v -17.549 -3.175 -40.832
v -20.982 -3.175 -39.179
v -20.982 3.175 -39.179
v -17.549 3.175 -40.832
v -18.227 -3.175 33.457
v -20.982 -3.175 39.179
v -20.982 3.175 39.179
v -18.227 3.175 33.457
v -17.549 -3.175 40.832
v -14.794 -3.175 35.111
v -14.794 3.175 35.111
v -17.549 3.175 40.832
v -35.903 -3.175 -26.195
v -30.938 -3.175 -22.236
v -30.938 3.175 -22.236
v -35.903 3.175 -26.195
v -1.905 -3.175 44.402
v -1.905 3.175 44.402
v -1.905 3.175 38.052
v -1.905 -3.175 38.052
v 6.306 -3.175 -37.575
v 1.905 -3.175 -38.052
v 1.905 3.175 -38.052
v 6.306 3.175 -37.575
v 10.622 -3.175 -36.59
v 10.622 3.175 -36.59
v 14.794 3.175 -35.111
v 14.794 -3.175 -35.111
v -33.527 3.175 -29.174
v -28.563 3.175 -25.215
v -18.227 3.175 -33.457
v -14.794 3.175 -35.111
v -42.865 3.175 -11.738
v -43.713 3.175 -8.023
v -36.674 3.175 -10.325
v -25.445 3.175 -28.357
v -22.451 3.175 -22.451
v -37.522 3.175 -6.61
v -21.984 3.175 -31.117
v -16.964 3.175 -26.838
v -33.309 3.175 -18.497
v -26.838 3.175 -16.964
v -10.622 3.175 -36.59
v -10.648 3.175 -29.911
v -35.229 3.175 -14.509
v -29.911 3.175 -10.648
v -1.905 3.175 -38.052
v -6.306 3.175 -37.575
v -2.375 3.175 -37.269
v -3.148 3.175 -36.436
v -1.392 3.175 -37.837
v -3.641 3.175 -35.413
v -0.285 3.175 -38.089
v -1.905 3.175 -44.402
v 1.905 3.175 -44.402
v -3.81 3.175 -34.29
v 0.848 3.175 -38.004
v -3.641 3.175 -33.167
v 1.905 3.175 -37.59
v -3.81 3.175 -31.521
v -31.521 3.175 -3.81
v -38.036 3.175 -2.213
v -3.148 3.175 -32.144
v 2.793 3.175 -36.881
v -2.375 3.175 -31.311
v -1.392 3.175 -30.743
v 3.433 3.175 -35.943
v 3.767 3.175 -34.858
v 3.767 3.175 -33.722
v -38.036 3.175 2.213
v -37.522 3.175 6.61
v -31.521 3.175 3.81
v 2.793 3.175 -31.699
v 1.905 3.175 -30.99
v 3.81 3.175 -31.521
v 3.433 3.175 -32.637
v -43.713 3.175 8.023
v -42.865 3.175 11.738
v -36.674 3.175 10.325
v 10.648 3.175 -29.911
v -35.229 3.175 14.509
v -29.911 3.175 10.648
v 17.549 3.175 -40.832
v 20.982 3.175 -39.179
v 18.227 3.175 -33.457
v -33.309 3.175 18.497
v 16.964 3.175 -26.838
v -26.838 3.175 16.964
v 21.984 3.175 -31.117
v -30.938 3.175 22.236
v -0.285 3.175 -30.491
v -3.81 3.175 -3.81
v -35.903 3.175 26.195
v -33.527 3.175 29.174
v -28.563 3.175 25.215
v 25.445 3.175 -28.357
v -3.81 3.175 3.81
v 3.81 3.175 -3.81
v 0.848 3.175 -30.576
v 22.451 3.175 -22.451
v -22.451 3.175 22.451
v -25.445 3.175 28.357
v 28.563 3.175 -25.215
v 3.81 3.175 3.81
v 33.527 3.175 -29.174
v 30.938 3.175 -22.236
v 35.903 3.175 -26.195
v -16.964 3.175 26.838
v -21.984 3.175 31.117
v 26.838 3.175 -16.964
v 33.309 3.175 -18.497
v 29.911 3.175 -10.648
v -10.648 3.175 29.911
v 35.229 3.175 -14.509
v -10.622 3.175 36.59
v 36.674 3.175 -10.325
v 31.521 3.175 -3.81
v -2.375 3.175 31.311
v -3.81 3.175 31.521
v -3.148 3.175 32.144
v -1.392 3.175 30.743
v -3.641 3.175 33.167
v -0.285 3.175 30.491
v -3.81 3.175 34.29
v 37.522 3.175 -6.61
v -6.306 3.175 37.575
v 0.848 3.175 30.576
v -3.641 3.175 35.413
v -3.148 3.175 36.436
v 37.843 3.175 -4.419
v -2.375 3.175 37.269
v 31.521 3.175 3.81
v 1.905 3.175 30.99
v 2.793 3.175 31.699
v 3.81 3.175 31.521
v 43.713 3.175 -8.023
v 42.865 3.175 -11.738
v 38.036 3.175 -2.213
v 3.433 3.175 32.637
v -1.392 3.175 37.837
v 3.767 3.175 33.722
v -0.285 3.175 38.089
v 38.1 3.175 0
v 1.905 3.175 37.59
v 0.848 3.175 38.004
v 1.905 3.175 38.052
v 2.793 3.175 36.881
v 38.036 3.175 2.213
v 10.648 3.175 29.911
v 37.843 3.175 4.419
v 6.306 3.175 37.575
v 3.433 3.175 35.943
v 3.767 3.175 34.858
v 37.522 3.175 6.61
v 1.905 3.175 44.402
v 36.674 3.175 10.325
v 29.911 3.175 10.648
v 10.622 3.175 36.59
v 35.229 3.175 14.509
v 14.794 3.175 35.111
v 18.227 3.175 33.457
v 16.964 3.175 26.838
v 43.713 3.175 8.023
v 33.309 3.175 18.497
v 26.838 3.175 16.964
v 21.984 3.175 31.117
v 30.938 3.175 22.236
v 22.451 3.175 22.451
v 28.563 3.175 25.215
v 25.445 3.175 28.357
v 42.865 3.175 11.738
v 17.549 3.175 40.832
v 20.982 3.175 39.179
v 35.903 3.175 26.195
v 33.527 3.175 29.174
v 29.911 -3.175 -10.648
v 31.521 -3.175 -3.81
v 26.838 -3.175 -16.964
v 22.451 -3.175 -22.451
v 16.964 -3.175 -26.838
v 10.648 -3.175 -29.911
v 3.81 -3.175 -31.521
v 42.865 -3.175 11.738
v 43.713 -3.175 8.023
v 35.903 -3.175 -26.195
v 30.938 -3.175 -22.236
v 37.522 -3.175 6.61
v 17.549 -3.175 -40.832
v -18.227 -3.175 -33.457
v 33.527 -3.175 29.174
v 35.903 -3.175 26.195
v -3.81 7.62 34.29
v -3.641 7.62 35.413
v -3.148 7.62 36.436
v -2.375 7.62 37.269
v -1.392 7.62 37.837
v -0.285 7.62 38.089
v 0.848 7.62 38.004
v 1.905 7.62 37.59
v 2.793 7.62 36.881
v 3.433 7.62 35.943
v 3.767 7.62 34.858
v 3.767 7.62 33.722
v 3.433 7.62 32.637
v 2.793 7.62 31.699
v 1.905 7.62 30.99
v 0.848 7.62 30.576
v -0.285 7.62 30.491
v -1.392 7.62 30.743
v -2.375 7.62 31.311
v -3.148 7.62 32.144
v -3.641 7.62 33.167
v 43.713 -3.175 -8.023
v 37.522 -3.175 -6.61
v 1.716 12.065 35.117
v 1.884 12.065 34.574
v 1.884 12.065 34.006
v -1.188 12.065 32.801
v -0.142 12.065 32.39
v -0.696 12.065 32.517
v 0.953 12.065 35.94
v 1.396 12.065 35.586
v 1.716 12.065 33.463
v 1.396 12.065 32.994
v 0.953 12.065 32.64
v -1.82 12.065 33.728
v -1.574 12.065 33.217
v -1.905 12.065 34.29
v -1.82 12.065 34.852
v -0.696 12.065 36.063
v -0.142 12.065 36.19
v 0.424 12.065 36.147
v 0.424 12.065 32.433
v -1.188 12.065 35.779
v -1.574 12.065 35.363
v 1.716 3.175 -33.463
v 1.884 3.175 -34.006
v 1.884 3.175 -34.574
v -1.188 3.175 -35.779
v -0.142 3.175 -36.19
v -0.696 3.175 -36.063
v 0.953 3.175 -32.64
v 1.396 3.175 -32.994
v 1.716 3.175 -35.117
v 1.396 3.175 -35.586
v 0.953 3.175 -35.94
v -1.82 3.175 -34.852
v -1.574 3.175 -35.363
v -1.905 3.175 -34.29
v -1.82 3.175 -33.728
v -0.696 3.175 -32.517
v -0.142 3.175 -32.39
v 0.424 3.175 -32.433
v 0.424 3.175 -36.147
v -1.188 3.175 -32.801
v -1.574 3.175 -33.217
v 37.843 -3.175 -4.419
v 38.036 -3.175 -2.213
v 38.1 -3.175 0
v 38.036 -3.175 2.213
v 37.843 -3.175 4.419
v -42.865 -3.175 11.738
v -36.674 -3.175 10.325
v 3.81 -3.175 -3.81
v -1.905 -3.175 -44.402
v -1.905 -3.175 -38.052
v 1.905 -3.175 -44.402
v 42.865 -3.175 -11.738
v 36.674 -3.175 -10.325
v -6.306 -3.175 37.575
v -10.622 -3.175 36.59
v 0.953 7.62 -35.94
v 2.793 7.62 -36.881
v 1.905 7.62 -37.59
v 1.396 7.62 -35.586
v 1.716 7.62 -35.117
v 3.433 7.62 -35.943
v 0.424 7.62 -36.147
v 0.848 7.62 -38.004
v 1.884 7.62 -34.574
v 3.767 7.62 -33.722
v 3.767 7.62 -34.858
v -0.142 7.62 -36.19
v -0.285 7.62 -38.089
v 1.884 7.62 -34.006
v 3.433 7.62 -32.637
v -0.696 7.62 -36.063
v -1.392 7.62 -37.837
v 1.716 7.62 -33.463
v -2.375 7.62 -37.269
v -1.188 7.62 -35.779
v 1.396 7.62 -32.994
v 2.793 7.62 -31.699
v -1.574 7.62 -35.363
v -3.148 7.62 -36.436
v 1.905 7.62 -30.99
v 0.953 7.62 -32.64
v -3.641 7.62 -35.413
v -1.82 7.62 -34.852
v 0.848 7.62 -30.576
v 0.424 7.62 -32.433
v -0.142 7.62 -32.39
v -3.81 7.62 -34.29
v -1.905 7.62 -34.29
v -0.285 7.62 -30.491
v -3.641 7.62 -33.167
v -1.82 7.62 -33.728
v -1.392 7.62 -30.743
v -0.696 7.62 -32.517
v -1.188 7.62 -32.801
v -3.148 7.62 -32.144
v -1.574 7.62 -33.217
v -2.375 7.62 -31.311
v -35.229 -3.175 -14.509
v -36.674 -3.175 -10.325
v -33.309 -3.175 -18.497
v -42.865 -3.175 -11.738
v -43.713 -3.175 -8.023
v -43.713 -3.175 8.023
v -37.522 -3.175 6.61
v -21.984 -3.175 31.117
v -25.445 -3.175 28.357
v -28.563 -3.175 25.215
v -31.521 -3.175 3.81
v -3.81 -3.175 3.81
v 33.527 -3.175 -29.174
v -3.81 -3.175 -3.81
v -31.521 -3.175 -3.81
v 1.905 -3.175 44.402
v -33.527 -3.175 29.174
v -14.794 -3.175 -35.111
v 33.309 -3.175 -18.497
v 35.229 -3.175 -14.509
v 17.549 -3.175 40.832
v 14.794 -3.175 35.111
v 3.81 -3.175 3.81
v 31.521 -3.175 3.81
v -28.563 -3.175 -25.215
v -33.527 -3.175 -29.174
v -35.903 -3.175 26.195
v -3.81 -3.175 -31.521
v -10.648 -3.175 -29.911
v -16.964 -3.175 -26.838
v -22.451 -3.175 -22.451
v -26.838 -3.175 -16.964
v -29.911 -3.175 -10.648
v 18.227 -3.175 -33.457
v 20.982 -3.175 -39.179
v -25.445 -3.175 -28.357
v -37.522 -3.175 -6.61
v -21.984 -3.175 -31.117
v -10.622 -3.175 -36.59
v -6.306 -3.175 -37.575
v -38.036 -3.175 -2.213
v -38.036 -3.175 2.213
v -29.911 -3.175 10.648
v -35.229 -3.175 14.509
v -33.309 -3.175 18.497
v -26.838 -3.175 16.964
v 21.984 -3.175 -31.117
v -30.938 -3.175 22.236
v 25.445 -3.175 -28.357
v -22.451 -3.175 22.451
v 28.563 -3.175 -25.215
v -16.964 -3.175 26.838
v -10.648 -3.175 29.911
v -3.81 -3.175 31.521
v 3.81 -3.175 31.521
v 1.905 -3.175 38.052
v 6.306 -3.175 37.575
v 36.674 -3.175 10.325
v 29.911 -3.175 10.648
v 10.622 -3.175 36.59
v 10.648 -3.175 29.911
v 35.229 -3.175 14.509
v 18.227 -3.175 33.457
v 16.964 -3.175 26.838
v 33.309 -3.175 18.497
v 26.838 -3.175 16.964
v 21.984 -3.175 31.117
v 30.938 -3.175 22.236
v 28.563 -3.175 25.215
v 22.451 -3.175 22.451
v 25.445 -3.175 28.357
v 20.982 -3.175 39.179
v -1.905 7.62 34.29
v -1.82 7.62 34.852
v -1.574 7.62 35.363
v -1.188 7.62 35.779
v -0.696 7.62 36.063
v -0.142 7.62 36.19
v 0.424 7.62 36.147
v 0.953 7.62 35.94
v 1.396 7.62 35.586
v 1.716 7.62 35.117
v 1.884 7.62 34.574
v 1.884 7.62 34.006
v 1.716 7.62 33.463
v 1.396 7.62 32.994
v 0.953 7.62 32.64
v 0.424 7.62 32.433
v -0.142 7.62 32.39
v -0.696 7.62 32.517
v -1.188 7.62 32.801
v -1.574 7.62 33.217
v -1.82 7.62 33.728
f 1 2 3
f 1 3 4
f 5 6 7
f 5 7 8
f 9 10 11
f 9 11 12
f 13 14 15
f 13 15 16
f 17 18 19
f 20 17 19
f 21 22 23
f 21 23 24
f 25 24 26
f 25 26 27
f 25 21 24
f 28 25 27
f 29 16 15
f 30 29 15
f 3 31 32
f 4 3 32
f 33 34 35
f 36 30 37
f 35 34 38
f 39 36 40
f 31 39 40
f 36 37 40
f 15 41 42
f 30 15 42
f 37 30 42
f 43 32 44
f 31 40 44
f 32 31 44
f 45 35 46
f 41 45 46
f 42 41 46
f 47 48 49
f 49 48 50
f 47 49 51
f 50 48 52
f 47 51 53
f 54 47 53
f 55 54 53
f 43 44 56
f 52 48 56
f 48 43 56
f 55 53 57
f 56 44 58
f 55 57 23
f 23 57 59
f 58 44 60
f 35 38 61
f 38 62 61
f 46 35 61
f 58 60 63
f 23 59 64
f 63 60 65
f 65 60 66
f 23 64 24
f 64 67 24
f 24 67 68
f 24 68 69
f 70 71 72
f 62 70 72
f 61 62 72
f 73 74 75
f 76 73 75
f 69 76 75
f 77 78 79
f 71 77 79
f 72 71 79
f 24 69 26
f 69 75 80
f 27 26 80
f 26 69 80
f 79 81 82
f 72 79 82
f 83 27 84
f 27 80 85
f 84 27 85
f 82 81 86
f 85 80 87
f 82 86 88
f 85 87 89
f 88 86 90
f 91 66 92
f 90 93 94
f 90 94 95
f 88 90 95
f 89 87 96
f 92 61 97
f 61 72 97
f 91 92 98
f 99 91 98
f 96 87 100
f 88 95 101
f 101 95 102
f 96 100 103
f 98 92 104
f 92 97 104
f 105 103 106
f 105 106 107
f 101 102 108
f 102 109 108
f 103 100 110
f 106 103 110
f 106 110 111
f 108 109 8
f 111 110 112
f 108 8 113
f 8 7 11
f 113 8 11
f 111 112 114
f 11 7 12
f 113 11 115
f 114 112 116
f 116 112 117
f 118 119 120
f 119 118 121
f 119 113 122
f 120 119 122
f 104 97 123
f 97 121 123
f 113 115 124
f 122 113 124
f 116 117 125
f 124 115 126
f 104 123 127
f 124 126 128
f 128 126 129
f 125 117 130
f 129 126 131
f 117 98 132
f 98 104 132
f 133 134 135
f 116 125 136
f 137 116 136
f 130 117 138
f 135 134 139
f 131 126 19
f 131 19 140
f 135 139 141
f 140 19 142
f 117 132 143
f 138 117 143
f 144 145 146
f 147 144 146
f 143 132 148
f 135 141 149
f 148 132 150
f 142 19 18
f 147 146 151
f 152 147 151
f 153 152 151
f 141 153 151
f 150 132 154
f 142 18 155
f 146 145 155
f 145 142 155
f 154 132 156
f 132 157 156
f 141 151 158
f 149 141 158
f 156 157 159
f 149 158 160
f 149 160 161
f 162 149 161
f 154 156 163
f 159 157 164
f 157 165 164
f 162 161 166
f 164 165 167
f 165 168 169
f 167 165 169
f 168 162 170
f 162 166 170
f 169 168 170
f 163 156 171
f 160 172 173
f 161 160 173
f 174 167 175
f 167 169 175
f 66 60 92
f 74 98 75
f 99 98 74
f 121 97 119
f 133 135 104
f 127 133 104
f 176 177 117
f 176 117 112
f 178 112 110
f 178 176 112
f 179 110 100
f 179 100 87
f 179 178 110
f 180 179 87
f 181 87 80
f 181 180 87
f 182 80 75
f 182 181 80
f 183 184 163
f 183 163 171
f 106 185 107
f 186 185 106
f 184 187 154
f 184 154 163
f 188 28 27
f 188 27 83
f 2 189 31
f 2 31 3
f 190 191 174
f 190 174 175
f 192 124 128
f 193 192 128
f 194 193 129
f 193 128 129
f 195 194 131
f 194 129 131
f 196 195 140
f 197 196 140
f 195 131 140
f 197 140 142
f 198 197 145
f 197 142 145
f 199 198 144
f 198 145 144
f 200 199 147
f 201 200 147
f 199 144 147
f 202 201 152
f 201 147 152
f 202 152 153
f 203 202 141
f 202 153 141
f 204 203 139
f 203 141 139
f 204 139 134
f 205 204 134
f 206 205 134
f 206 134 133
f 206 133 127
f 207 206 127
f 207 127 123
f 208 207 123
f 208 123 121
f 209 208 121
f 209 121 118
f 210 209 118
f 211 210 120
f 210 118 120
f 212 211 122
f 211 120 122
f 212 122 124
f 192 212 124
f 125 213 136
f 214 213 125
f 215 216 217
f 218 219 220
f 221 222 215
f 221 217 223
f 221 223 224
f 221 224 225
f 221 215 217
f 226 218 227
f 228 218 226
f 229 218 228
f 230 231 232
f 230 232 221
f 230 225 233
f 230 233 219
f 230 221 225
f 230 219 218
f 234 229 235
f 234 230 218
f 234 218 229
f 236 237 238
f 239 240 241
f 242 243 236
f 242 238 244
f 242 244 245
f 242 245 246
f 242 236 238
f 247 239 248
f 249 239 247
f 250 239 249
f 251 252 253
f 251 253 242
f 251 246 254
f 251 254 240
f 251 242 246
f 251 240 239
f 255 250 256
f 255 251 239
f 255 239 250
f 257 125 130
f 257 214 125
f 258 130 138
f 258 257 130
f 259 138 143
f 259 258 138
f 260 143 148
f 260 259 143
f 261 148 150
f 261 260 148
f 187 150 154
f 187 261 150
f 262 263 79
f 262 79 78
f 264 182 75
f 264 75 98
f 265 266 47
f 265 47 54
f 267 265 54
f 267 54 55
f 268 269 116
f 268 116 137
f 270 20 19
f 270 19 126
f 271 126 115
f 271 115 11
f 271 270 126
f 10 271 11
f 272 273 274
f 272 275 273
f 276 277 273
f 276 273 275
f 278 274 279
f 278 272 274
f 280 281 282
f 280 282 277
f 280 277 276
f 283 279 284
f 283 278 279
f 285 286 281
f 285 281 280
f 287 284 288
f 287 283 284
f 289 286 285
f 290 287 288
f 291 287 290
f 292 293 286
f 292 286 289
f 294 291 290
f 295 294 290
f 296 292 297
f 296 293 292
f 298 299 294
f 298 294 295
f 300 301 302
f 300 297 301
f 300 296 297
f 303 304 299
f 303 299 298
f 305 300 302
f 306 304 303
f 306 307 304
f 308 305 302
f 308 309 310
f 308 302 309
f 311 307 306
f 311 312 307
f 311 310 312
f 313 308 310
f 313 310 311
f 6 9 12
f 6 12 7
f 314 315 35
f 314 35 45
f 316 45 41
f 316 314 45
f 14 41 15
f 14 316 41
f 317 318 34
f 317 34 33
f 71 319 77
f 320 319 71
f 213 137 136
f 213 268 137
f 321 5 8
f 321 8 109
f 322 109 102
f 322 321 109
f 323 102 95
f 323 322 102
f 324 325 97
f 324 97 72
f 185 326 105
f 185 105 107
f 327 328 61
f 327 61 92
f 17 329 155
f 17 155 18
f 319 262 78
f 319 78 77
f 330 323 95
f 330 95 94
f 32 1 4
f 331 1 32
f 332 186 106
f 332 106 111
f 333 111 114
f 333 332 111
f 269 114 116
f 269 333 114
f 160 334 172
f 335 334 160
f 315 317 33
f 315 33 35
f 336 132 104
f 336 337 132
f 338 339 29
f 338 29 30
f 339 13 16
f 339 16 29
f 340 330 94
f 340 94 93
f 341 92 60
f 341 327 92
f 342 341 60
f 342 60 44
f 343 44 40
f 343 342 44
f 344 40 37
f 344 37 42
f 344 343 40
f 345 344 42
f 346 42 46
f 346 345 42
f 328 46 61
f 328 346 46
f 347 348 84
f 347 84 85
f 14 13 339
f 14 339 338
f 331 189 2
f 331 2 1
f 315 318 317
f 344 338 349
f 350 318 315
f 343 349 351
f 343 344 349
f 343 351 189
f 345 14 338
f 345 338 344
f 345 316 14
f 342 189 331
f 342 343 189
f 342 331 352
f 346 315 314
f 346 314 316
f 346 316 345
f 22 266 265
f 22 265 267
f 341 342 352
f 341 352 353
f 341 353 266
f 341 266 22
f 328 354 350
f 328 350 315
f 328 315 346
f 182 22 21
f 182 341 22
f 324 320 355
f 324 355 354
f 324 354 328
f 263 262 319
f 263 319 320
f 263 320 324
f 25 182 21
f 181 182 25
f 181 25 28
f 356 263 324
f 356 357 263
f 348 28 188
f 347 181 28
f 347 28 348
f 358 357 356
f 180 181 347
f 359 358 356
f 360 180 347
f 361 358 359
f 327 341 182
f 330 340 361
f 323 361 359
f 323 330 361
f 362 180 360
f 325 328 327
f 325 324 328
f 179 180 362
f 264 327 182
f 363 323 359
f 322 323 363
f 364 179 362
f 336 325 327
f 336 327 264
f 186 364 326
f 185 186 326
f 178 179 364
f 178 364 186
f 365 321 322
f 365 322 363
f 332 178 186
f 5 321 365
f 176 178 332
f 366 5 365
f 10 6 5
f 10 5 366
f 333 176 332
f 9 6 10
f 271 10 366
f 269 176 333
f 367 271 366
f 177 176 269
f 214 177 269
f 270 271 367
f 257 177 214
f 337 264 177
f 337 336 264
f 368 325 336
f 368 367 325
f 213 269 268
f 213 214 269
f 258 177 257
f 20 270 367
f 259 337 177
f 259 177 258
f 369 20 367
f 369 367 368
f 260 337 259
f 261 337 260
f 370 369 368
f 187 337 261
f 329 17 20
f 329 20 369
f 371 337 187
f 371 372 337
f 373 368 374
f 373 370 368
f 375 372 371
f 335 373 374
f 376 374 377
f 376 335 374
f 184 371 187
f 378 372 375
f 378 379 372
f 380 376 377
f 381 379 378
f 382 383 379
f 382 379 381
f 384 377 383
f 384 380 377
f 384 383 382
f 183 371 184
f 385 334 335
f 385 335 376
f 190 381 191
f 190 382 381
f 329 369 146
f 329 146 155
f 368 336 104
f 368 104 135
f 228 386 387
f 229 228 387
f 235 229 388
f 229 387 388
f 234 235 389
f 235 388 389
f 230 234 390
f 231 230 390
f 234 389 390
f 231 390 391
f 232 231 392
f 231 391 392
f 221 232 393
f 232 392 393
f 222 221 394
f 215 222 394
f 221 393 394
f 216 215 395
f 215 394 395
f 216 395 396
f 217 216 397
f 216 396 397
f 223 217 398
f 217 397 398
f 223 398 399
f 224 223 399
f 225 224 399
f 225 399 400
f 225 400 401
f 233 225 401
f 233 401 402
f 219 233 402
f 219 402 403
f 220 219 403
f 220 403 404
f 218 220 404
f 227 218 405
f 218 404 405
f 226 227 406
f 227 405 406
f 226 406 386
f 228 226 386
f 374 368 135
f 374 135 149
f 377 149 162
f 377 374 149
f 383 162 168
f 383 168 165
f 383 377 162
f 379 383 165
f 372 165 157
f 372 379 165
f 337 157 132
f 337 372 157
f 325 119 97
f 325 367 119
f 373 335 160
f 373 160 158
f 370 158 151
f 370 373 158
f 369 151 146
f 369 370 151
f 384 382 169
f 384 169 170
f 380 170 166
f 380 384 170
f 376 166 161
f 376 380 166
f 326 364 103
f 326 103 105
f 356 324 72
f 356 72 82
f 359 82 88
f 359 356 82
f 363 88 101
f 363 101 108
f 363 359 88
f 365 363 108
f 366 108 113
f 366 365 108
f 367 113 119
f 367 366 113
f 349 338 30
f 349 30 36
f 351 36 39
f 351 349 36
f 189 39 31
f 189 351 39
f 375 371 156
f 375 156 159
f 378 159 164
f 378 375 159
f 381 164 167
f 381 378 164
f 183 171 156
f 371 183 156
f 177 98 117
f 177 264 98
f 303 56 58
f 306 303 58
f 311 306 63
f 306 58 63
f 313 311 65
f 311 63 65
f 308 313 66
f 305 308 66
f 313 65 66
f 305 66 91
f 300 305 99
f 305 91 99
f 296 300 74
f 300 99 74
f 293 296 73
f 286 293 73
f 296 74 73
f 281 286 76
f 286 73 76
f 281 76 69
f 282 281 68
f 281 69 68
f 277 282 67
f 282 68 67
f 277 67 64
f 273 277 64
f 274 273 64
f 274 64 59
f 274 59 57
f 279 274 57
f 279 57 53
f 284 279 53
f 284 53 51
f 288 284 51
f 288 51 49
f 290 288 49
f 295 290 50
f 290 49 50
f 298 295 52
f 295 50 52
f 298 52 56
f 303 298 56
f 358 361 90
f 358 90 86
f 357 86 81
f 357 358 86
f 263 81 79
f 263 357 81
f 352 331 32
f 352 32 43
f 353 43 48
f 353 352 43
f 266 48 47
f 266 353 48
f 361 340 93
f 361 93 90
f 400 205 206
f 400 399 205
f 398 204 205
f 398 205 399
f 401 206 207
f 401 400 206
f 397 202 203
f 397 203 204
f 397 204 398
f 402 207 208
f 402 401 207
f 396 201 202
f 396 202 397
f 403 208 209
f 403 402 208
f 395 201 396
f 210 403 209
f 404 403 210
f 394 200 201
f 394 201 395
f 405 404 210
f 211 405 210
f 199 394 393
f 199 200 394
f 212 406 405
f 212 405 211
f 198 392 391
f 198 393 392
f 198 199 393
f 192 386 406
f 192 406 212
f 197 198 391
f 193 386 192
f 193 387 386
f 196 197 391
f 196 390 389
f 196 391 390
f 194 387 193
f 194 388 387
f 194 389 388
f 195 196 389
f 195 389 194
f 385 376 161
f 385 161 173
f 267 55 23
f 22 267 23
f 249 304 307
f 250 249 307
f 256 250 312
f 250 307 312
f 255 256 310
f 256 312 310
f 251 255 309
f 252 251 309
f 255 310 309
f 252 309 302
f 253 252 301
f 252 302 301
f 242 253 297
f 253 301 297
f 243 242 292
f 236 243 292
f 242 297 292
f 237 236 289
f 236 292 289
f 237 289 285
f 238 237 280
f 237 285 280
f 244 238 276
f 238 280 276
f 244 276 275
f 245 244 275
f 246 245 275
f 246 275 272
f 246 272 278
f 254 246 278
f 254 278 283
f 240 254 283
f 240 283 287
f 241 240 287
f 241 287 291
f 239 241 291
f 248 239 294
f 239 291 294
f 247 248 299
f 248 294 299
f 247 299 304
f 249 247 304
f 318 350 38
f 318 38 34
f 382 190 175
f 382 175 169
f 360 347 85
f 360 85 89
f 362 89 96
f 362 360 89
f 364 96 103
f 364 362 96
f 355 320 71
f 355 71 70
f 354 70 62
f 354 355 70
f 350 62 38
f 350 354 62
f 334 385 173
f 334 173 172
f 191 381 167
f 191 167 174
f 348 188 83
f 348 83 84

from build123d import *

# Parameters (mm, degrees)
F0_W     = 7.62
F0_H     = 7.62
F1_DEPTH = 3.175
F2_R     = 3.81
F3_DEPTH = 4.445
F4_R     = 1.905
F5_DEPTH = 4.445
F6_R     = 1.905
F7_DEPTH = 4.445


with BuildPart() as f1:
    # F0 (on Front) → F1 (new body, symmetric)
    with BuildSketch(Plane.XZ):
        with BuildLine():
            ThreePointArc((37.5221958358, -6.6102057198), (37.9552740824, -3.3177054311), (38.1, 0))
            ThreePointArc((38.1, 0), (37.9552740824, 3.3177054311), (37.5221958358, 6.6102057198))
            ThreePointArc((37.5221958358, 6.6102057198), (37.1447534541, 8.4780475837), (36.6743910775, 10.3246810652))
            ThreePointArc((36.6743910775, 10.3246810652), (34.3269138671, 16.5309704604), (30.9382695294, 22.2358601931))
            ThreePointArc((30.9382695294, 22.2358601931), (29.787779482, 23.7549614508), (28.5627733843, 25.2146381413))
            ThreePointArc((28.5627733843, 25.2146381413), (23.7549614508, 29.787779482), (18.2266395097, 33.4574298503))
            ThreePointArc((18.2266395097, 33.4574298503), (16.5309704604, 34.3269138671), (14.793948123, 35.1105268963))
            ThreePointArc((14.793948123, 35.1105268963), (8.4780475837, 37.1447534541), (1.905, 38.0523451971))
            ThreePointArc((1.905, 38.0523451971), (0, 38.1), (-1.905, 38.0523451971))
            ThreePointArc((-1.905, 38.0523451971), (-8.4780475837, 37.1447534541), (-14.793948123, 35.1105268963))
            ThreePointArc((-14.793948123, 35.1105268963), (-16.5309704604, 34.3269138671), (-18.2266395097, 33.4574298503))
            ThreePointArc((-18.2266395097, 33.4574298503), (-23.7549614508, 29.787779482), (-28.5627733843, 25.2146381413))
            ThreePointArc((-28.5627733843, 25.2146381413), (-29.787779482, 23.7549614508), (-30.9382695294, 22.2358601931))
            ThreePointArc((-30.9382695294, 22.2358601931), (-34.3269138671, 16.5309704604), (-36.6743910775, 10.3246810652))
            ThreePointArc((-36.6743910775, 10.3246810652), (-37.1447534541, 8.4780475837), (-37.5221958358, 6.6102057198))
            ThreePointArc((-37.5221958358, 6.6102057198), (-38.1, 0), (-37.5221958358, -6.6102057198))
            ThreePointArc((-37.5221958358, -6.6102057198), (-37.1447534541, -8.4780475837), (-36.6743910775, -10.3246810652))
            ThreePointArc((-36.6743910775, -10.3246810652), (-34.3269138671, -16.5309704604), (-30.9382695294, -22.2358601931))
            ThreePointArc((-30.9382695294, -22.2358601931), (-29.787779482, -23.7549614508), (-28.5627733843, -25.2146381413))
            ThreePointArc((-28.5627733843, -25.2146381413), (-23.7549614508, -29.787779482), (-18.2266395097, -33.4574298503))
            ThreePointArc((-18.2266395097, -33.4574298503), (-16.5309704604, -34.3269138671), (-14.793948123, -35.1105268963))
            ThreePointArc((-14.793948123, -35.1105268963), (-8.4780475837, -37.1447534541), (-1.905, -38.0523451971))
            ThreePointArc((-1.905, -38.0523451971), (0, -38.1), (1.905, -38.0523451971))
            ThreePointArc((1.905, -38.0523451971), (8.4780475837, -37.1447534541), (14.793948123, -35.1105268963))
            ThreePointArc((14.793948123, -35.1105268963), (16.5309704604, -34.3269138671), (18.2266395097, -33.4574298503))
            ThreePointArc((18.2266395097, -33.4574298503), (23.7549614508, -29.787779482), (28.5627733843, -25.2146381413))
            ThreePointArc((28.5627733843, -25.2146381413), (29.787779482, -23.7549614508), (30.9382695294, -22.2358601931))
            ThreePointArc((30.9382695294, -22.2358601931), (34.3269138671, -16.5309704604), (36.6743910775, -10.3246810652))
            ThreePointArc((36.6743910775, -10.3246810652), (37.1447534541, -8.4780475837), (37.5221958358, -6.6102057198))
        make_face()
        with BuildLine():
            ThreePointArc((31.5205710608, 3.81), (31.6925908627, 1.9084507878), (31.75, 0))
            ThreePointArc((31.75, 0), (31.6925908627, -1.9084507878), (31.5205710608, -3.81))
            ThreePointArc((31.5205710608, -3.81), (22.4506403027, -22.4506403027), (3.81, -31.5205710608))
            ThreePointArc((3.81, -31.5205710608), (0, -31.75), (-3.81, -31.5205710608))
            ThreePointArc((-3.81, -31.5205710608), (-22.4506403027, -22.4506403027), (-31.5205710608, -3.81))
            ThreePointArc((-31.5205710608, -3.81), (-31.75, 0), (-31.5205710608, 3.81))
            ThreePointArc((-31.5205710608, 3.81), (-22.4506403027, 22.4506403027), (-3.81, 31.5205710608))
            ThreePointArc((-3.81, 31.5205710608), (0, 31.75), (3.81, 31.5205710608))
            ThreePointArc((3.81, 31.5205710608), (22.4506403027, 22.4506403027), (31.5205710608, 3.81))
        make_face(mode=Mode.SUBTRACT)
        with BuildLine():
            ThreePointArc((36.6743910775, 10.3246810652), (37.1447534541, 8.4780475837), (37.5221958358, 6.6102057198))
            Line((37.5221958358, 6.6102057198), (43.7129880782, 8.0232136504))
            Line((43.7129880782, 8.0232136504), (42.8651833198, 11.7376889958))
            Line((42.8651833198, 11.7376889958), (36.6743910775, 10.3246810652))
        make_face()
        with BuildLine():
            Line((43.7129880782, -8.0232136504), (37.5221958358, -6.6102057198))
            ThreePointArc((37.5221958358, -6.6102057198), (37.1447534541, -8.4780475837), (36.6743910775, -10.3246810652))
            Line((36.6743910775, -10.3246810652), (42.8651833198, -11.7376889958))
            Line((42.8651833198, -11.7376889958), (43.7129880782, -8.0232136504))
        make_face()
        with BuildLine():
            ThreePointArc((28.5627733843, 25.2146381413), (29.787779482, 23.7549614508), (30.9382695294, 22.2358601931))
            Line((30.9382695294, 22.2358601931), (35.9028994431, 26.1950204349))
            Line((35.9028994431, 26.1950204349), (33.527403298, 29.1737983831))
            Line((33.527403298, 29.1737983831), (28.5627733843, 25.2146381413))
        make_face()
        with BuildLine():
            Line((35.9028994431, -26.1950204349), (30.9382695294, -22.2358601931))
            ThreePointArc((30.9382695294, -22.2358601931), (29.787779482, -23.7549614508), (28.5627733843, -25.2146381413))
            Line((28.5627733843, -25.2146381413), (33.527403298, -29.1737983831))
            Line((33.527403298, -29.1737983831), (35.9028994431, -26.1950204349))
        make_face()
        with BuildLine():
            ThreePointArc((14.793948123, 35.1105268963), (16.5309704604, 34.3269138671), (18.2266395097, 33.4574298503))
            Line((18.2266395097, 33.4574298503), (20.9818012531, 39.1785821614))
            Line((20.9818012531, 39.1785821614), (17.5491098664, 40.8316792075))
            Line((17.5491098664, 40.8316792075), (14.793948123, 35.1105268963))
        make_face()
        with BuildLine():
            Line((20.9818012531, -39.1785821614), (18.2266395097, -33.4574298503))
            ThreePointArc((18.2266395097, -33.4574298503), (16.5309704604, -34.3269138671), (14.793948123, -35.1105268963))
            Line((14.793948123, -35.1105268963), (17.5491098664, -40.8316792075))
            Line((17.5491098664, -40.8316792075), (20.9818012531, -39.1785821614))
        make_face()
        with BuildLine():
            ThreePointArc((-1.905, 38.0523451971), (0, 38.1), (1.905, 38.0523451971))
            Line((1.905, 38.0523451971), (1.905, 44.4023451971))
            Line((1.905, 44.4023451971), (-1.905, 44.4023451971))
            Line((-1.905, 44.4023451971), (-1.905, 38.0523451971))
        make_face()
        with BuildLine():
            Line((1.905, -44.4023451971), (1.905, -38.0523451971))
            ThreePointArc((1.905, -38.0523451971), (0, -38.1), (-1.905, -38.0523451971))
            Line((-1.905, -38.0523451971), (-1.905, -44.4023451971))
            Line((-1.905, -44.4023451971), (1.905, -44.4023451971))
        make_face()
        with BuildLine():
            ThreePointArc((-18.2266395097, 33.4574298503), (-16.5309704604, 34.3269138671), (-14.793948123, 35.1105268963))
            Line((-14.793948123, 35.1105268963), (-17.5491098664, 40.8316792075))
            Line((-17.5491098664, 40.8316792075), (-20.9818012531, 39.1785821614))
            Line((-20.9818012531, 39.1785821614), (-18.2266395097, 33.4574298503))
        make_face()
        with BuildLine():
            Line((-17.5491098664, -40.8316792075), (-14.793948123, -35.1105268963))
            ThreePointArc((-14.793948123, -35.1105268963), (-16.5309704604, -34.3269138671), (-18.2266395097, -33.4574298503))
            Line((-18.2266395097, -33.4574298503), (-20.9818012531, -39.1785821614))
            Line((-20.9818012531, -39.1785821614), (-17.5491098664, -40.8316792075))
        make_face()
        with BuildLine():
            ThreePointArc((-30.9382695294, 22.2358601931), (-29.787779482, 23.7549614508), (-28.5627733843, 25.2146381413))
            Line((-28.5627733843, 25.2146381413), (-33.527403298, 29.1737983831))
            Line((-33.527403298, 29.1737983831), (-35.9028994431, 26.1950204349))
            Line((-35.9028994431, 26.1950204349), (-30.9382695294, 22.2358601931))
        make_face()
        with BuildLine():
            Line((-33.527403298, -29.1737983831), (-28.5627733843, -25.2146381413))
            ThreePointArc((-28.5627733843, -25.2146381413), (-29.787779482, -23.7549614508), (-30.9382695294, -22.2358601931))
            Line((-30.9382695294, -22.2358601931), (-35.9028994431, -26.1950204349))
            Line((-35.9028994431, -26.1950204349), (-33.527403298, -29.1737983831))
        make_face()
        with BuildLine():
            ThreePointArc((-37.5221958358, 6.6102057198), (-37.1447534541, 8.4780475837), (-36.6743910775, 10.3246810652))
            Line((-36.6743910775, 10.3246810652), (-42.8651833198, 11.7376889958))
            Line((-42.8651833198, 11.7376889958), (-43.7129880782, 8.0232136504))
            Line((-43.7129880782, 8.0232136504), (-37.5221958358, 6.6102057198))
        make_face()
        with BuildLine():
            Line((-42.8651833198, -11.7376889958), (-36.6743910775, -10.3246810652))
            ThreePointArc((-36.6743910775, -10.3246810652), (-37.1447534541, -8.4780475837), (-37.5221958358, -6.6102057198))
            Line((-37.5221958358, -6.6102057198), (-43.7129880782, -8.0232136504))
            Line((-43.7129880782, -8.0232136504), (-42.8651833198, -11.7376889958))
        make_face()
        with BuildLine():
            ThreePointArc((31.5205710608, -3.81), (31.6925908627, -1.9084507878), (31.75, 0))
            ThreePointArc((31.75, 0), (31.6925908627, 1.9084507878), (31.5205710608, 3.81))
            Line((31.5205710608, 3.81), (3.81, 3.81))
            Line((3.81, 3.81), (3.81, -3.81))
            Line((3.81, -3.81), (31.5205710608, -3.81))
        make_face()
        with BuildLine():
            Line((3.81, 3.81), (3.81, 31.5205710608))
            ThreePointArc((3.81, 31.5205710608), (0, 31.75), (-3.81, 31.5205710608))
            Line((-3.81, 31.5205710608), (-3.81, 3.81))
            Line((-3.81, 3.81), (3.81, 3.81))
        make_face()
        Rectangle(F0_W, F0_H)
        with BuildLine():
            ThreePointArc((-3.81, -31.5205710608), (0, -31.75), (3.81, -31.5205710608))
            Line((3.81, -31.5205710608), (3.81, -3.81))
            Line((3.81, -3.81), (-3.81, -3.81))
            Line((-3.81, -3.81), (-3.81, -31.5205710608))
        make_face()
        with BuildLine():
            Line((-3.81, -3.81), (-3.81, 3.81))
            Line((-3.81, 3.81), (-31.5205710608, 3.81))
            ThreePointArc((-31.5205710608, 3.81), (-31.75, 0), (-31.5205710608, -3.81))
            Line((-31.5205710608, -3.81), (-3.81, -3.81))
        make_face()
    extrude(amount=F1_DEPTH, both=True)

    # F2 (on face) → F3 (join)
    with BuildSketch(Plane(origin=(0, 3.175, 0), x_dir=(-1, 0, 0), z_dir=(0, 1, 0))):
        with Locations((0, 34.29)):
            Circle(F2_R)
        with Locations((0, -34.29)):
            Circle(F2_R)
    extrude(amount=F3_DEPTH)

    # F4 (on face) → F5 (join)
    with BuildSketch(Plane(origin=(0, 7.62, 0), x_dir=(-1, 0, 0), z_dir=(0, 1, 0))):
        with Locations((0, 34.29)):
            Circle(F4_R)
    extrude(amount=F5_DEPTH)

    # F6 (on face) → F7 (cut)
    with BuildSketch(Plane(origin=(0, 7.62, 0), x_dir=(-1, 0, 0), z_dir=(0, 1, 0))):
        with Locations((0, -34.29)):
            Circle(F6_R)
    extrude(amount=-F7_DEPTH, mode=Mode.SUBTRACT)


solid = f1.part
